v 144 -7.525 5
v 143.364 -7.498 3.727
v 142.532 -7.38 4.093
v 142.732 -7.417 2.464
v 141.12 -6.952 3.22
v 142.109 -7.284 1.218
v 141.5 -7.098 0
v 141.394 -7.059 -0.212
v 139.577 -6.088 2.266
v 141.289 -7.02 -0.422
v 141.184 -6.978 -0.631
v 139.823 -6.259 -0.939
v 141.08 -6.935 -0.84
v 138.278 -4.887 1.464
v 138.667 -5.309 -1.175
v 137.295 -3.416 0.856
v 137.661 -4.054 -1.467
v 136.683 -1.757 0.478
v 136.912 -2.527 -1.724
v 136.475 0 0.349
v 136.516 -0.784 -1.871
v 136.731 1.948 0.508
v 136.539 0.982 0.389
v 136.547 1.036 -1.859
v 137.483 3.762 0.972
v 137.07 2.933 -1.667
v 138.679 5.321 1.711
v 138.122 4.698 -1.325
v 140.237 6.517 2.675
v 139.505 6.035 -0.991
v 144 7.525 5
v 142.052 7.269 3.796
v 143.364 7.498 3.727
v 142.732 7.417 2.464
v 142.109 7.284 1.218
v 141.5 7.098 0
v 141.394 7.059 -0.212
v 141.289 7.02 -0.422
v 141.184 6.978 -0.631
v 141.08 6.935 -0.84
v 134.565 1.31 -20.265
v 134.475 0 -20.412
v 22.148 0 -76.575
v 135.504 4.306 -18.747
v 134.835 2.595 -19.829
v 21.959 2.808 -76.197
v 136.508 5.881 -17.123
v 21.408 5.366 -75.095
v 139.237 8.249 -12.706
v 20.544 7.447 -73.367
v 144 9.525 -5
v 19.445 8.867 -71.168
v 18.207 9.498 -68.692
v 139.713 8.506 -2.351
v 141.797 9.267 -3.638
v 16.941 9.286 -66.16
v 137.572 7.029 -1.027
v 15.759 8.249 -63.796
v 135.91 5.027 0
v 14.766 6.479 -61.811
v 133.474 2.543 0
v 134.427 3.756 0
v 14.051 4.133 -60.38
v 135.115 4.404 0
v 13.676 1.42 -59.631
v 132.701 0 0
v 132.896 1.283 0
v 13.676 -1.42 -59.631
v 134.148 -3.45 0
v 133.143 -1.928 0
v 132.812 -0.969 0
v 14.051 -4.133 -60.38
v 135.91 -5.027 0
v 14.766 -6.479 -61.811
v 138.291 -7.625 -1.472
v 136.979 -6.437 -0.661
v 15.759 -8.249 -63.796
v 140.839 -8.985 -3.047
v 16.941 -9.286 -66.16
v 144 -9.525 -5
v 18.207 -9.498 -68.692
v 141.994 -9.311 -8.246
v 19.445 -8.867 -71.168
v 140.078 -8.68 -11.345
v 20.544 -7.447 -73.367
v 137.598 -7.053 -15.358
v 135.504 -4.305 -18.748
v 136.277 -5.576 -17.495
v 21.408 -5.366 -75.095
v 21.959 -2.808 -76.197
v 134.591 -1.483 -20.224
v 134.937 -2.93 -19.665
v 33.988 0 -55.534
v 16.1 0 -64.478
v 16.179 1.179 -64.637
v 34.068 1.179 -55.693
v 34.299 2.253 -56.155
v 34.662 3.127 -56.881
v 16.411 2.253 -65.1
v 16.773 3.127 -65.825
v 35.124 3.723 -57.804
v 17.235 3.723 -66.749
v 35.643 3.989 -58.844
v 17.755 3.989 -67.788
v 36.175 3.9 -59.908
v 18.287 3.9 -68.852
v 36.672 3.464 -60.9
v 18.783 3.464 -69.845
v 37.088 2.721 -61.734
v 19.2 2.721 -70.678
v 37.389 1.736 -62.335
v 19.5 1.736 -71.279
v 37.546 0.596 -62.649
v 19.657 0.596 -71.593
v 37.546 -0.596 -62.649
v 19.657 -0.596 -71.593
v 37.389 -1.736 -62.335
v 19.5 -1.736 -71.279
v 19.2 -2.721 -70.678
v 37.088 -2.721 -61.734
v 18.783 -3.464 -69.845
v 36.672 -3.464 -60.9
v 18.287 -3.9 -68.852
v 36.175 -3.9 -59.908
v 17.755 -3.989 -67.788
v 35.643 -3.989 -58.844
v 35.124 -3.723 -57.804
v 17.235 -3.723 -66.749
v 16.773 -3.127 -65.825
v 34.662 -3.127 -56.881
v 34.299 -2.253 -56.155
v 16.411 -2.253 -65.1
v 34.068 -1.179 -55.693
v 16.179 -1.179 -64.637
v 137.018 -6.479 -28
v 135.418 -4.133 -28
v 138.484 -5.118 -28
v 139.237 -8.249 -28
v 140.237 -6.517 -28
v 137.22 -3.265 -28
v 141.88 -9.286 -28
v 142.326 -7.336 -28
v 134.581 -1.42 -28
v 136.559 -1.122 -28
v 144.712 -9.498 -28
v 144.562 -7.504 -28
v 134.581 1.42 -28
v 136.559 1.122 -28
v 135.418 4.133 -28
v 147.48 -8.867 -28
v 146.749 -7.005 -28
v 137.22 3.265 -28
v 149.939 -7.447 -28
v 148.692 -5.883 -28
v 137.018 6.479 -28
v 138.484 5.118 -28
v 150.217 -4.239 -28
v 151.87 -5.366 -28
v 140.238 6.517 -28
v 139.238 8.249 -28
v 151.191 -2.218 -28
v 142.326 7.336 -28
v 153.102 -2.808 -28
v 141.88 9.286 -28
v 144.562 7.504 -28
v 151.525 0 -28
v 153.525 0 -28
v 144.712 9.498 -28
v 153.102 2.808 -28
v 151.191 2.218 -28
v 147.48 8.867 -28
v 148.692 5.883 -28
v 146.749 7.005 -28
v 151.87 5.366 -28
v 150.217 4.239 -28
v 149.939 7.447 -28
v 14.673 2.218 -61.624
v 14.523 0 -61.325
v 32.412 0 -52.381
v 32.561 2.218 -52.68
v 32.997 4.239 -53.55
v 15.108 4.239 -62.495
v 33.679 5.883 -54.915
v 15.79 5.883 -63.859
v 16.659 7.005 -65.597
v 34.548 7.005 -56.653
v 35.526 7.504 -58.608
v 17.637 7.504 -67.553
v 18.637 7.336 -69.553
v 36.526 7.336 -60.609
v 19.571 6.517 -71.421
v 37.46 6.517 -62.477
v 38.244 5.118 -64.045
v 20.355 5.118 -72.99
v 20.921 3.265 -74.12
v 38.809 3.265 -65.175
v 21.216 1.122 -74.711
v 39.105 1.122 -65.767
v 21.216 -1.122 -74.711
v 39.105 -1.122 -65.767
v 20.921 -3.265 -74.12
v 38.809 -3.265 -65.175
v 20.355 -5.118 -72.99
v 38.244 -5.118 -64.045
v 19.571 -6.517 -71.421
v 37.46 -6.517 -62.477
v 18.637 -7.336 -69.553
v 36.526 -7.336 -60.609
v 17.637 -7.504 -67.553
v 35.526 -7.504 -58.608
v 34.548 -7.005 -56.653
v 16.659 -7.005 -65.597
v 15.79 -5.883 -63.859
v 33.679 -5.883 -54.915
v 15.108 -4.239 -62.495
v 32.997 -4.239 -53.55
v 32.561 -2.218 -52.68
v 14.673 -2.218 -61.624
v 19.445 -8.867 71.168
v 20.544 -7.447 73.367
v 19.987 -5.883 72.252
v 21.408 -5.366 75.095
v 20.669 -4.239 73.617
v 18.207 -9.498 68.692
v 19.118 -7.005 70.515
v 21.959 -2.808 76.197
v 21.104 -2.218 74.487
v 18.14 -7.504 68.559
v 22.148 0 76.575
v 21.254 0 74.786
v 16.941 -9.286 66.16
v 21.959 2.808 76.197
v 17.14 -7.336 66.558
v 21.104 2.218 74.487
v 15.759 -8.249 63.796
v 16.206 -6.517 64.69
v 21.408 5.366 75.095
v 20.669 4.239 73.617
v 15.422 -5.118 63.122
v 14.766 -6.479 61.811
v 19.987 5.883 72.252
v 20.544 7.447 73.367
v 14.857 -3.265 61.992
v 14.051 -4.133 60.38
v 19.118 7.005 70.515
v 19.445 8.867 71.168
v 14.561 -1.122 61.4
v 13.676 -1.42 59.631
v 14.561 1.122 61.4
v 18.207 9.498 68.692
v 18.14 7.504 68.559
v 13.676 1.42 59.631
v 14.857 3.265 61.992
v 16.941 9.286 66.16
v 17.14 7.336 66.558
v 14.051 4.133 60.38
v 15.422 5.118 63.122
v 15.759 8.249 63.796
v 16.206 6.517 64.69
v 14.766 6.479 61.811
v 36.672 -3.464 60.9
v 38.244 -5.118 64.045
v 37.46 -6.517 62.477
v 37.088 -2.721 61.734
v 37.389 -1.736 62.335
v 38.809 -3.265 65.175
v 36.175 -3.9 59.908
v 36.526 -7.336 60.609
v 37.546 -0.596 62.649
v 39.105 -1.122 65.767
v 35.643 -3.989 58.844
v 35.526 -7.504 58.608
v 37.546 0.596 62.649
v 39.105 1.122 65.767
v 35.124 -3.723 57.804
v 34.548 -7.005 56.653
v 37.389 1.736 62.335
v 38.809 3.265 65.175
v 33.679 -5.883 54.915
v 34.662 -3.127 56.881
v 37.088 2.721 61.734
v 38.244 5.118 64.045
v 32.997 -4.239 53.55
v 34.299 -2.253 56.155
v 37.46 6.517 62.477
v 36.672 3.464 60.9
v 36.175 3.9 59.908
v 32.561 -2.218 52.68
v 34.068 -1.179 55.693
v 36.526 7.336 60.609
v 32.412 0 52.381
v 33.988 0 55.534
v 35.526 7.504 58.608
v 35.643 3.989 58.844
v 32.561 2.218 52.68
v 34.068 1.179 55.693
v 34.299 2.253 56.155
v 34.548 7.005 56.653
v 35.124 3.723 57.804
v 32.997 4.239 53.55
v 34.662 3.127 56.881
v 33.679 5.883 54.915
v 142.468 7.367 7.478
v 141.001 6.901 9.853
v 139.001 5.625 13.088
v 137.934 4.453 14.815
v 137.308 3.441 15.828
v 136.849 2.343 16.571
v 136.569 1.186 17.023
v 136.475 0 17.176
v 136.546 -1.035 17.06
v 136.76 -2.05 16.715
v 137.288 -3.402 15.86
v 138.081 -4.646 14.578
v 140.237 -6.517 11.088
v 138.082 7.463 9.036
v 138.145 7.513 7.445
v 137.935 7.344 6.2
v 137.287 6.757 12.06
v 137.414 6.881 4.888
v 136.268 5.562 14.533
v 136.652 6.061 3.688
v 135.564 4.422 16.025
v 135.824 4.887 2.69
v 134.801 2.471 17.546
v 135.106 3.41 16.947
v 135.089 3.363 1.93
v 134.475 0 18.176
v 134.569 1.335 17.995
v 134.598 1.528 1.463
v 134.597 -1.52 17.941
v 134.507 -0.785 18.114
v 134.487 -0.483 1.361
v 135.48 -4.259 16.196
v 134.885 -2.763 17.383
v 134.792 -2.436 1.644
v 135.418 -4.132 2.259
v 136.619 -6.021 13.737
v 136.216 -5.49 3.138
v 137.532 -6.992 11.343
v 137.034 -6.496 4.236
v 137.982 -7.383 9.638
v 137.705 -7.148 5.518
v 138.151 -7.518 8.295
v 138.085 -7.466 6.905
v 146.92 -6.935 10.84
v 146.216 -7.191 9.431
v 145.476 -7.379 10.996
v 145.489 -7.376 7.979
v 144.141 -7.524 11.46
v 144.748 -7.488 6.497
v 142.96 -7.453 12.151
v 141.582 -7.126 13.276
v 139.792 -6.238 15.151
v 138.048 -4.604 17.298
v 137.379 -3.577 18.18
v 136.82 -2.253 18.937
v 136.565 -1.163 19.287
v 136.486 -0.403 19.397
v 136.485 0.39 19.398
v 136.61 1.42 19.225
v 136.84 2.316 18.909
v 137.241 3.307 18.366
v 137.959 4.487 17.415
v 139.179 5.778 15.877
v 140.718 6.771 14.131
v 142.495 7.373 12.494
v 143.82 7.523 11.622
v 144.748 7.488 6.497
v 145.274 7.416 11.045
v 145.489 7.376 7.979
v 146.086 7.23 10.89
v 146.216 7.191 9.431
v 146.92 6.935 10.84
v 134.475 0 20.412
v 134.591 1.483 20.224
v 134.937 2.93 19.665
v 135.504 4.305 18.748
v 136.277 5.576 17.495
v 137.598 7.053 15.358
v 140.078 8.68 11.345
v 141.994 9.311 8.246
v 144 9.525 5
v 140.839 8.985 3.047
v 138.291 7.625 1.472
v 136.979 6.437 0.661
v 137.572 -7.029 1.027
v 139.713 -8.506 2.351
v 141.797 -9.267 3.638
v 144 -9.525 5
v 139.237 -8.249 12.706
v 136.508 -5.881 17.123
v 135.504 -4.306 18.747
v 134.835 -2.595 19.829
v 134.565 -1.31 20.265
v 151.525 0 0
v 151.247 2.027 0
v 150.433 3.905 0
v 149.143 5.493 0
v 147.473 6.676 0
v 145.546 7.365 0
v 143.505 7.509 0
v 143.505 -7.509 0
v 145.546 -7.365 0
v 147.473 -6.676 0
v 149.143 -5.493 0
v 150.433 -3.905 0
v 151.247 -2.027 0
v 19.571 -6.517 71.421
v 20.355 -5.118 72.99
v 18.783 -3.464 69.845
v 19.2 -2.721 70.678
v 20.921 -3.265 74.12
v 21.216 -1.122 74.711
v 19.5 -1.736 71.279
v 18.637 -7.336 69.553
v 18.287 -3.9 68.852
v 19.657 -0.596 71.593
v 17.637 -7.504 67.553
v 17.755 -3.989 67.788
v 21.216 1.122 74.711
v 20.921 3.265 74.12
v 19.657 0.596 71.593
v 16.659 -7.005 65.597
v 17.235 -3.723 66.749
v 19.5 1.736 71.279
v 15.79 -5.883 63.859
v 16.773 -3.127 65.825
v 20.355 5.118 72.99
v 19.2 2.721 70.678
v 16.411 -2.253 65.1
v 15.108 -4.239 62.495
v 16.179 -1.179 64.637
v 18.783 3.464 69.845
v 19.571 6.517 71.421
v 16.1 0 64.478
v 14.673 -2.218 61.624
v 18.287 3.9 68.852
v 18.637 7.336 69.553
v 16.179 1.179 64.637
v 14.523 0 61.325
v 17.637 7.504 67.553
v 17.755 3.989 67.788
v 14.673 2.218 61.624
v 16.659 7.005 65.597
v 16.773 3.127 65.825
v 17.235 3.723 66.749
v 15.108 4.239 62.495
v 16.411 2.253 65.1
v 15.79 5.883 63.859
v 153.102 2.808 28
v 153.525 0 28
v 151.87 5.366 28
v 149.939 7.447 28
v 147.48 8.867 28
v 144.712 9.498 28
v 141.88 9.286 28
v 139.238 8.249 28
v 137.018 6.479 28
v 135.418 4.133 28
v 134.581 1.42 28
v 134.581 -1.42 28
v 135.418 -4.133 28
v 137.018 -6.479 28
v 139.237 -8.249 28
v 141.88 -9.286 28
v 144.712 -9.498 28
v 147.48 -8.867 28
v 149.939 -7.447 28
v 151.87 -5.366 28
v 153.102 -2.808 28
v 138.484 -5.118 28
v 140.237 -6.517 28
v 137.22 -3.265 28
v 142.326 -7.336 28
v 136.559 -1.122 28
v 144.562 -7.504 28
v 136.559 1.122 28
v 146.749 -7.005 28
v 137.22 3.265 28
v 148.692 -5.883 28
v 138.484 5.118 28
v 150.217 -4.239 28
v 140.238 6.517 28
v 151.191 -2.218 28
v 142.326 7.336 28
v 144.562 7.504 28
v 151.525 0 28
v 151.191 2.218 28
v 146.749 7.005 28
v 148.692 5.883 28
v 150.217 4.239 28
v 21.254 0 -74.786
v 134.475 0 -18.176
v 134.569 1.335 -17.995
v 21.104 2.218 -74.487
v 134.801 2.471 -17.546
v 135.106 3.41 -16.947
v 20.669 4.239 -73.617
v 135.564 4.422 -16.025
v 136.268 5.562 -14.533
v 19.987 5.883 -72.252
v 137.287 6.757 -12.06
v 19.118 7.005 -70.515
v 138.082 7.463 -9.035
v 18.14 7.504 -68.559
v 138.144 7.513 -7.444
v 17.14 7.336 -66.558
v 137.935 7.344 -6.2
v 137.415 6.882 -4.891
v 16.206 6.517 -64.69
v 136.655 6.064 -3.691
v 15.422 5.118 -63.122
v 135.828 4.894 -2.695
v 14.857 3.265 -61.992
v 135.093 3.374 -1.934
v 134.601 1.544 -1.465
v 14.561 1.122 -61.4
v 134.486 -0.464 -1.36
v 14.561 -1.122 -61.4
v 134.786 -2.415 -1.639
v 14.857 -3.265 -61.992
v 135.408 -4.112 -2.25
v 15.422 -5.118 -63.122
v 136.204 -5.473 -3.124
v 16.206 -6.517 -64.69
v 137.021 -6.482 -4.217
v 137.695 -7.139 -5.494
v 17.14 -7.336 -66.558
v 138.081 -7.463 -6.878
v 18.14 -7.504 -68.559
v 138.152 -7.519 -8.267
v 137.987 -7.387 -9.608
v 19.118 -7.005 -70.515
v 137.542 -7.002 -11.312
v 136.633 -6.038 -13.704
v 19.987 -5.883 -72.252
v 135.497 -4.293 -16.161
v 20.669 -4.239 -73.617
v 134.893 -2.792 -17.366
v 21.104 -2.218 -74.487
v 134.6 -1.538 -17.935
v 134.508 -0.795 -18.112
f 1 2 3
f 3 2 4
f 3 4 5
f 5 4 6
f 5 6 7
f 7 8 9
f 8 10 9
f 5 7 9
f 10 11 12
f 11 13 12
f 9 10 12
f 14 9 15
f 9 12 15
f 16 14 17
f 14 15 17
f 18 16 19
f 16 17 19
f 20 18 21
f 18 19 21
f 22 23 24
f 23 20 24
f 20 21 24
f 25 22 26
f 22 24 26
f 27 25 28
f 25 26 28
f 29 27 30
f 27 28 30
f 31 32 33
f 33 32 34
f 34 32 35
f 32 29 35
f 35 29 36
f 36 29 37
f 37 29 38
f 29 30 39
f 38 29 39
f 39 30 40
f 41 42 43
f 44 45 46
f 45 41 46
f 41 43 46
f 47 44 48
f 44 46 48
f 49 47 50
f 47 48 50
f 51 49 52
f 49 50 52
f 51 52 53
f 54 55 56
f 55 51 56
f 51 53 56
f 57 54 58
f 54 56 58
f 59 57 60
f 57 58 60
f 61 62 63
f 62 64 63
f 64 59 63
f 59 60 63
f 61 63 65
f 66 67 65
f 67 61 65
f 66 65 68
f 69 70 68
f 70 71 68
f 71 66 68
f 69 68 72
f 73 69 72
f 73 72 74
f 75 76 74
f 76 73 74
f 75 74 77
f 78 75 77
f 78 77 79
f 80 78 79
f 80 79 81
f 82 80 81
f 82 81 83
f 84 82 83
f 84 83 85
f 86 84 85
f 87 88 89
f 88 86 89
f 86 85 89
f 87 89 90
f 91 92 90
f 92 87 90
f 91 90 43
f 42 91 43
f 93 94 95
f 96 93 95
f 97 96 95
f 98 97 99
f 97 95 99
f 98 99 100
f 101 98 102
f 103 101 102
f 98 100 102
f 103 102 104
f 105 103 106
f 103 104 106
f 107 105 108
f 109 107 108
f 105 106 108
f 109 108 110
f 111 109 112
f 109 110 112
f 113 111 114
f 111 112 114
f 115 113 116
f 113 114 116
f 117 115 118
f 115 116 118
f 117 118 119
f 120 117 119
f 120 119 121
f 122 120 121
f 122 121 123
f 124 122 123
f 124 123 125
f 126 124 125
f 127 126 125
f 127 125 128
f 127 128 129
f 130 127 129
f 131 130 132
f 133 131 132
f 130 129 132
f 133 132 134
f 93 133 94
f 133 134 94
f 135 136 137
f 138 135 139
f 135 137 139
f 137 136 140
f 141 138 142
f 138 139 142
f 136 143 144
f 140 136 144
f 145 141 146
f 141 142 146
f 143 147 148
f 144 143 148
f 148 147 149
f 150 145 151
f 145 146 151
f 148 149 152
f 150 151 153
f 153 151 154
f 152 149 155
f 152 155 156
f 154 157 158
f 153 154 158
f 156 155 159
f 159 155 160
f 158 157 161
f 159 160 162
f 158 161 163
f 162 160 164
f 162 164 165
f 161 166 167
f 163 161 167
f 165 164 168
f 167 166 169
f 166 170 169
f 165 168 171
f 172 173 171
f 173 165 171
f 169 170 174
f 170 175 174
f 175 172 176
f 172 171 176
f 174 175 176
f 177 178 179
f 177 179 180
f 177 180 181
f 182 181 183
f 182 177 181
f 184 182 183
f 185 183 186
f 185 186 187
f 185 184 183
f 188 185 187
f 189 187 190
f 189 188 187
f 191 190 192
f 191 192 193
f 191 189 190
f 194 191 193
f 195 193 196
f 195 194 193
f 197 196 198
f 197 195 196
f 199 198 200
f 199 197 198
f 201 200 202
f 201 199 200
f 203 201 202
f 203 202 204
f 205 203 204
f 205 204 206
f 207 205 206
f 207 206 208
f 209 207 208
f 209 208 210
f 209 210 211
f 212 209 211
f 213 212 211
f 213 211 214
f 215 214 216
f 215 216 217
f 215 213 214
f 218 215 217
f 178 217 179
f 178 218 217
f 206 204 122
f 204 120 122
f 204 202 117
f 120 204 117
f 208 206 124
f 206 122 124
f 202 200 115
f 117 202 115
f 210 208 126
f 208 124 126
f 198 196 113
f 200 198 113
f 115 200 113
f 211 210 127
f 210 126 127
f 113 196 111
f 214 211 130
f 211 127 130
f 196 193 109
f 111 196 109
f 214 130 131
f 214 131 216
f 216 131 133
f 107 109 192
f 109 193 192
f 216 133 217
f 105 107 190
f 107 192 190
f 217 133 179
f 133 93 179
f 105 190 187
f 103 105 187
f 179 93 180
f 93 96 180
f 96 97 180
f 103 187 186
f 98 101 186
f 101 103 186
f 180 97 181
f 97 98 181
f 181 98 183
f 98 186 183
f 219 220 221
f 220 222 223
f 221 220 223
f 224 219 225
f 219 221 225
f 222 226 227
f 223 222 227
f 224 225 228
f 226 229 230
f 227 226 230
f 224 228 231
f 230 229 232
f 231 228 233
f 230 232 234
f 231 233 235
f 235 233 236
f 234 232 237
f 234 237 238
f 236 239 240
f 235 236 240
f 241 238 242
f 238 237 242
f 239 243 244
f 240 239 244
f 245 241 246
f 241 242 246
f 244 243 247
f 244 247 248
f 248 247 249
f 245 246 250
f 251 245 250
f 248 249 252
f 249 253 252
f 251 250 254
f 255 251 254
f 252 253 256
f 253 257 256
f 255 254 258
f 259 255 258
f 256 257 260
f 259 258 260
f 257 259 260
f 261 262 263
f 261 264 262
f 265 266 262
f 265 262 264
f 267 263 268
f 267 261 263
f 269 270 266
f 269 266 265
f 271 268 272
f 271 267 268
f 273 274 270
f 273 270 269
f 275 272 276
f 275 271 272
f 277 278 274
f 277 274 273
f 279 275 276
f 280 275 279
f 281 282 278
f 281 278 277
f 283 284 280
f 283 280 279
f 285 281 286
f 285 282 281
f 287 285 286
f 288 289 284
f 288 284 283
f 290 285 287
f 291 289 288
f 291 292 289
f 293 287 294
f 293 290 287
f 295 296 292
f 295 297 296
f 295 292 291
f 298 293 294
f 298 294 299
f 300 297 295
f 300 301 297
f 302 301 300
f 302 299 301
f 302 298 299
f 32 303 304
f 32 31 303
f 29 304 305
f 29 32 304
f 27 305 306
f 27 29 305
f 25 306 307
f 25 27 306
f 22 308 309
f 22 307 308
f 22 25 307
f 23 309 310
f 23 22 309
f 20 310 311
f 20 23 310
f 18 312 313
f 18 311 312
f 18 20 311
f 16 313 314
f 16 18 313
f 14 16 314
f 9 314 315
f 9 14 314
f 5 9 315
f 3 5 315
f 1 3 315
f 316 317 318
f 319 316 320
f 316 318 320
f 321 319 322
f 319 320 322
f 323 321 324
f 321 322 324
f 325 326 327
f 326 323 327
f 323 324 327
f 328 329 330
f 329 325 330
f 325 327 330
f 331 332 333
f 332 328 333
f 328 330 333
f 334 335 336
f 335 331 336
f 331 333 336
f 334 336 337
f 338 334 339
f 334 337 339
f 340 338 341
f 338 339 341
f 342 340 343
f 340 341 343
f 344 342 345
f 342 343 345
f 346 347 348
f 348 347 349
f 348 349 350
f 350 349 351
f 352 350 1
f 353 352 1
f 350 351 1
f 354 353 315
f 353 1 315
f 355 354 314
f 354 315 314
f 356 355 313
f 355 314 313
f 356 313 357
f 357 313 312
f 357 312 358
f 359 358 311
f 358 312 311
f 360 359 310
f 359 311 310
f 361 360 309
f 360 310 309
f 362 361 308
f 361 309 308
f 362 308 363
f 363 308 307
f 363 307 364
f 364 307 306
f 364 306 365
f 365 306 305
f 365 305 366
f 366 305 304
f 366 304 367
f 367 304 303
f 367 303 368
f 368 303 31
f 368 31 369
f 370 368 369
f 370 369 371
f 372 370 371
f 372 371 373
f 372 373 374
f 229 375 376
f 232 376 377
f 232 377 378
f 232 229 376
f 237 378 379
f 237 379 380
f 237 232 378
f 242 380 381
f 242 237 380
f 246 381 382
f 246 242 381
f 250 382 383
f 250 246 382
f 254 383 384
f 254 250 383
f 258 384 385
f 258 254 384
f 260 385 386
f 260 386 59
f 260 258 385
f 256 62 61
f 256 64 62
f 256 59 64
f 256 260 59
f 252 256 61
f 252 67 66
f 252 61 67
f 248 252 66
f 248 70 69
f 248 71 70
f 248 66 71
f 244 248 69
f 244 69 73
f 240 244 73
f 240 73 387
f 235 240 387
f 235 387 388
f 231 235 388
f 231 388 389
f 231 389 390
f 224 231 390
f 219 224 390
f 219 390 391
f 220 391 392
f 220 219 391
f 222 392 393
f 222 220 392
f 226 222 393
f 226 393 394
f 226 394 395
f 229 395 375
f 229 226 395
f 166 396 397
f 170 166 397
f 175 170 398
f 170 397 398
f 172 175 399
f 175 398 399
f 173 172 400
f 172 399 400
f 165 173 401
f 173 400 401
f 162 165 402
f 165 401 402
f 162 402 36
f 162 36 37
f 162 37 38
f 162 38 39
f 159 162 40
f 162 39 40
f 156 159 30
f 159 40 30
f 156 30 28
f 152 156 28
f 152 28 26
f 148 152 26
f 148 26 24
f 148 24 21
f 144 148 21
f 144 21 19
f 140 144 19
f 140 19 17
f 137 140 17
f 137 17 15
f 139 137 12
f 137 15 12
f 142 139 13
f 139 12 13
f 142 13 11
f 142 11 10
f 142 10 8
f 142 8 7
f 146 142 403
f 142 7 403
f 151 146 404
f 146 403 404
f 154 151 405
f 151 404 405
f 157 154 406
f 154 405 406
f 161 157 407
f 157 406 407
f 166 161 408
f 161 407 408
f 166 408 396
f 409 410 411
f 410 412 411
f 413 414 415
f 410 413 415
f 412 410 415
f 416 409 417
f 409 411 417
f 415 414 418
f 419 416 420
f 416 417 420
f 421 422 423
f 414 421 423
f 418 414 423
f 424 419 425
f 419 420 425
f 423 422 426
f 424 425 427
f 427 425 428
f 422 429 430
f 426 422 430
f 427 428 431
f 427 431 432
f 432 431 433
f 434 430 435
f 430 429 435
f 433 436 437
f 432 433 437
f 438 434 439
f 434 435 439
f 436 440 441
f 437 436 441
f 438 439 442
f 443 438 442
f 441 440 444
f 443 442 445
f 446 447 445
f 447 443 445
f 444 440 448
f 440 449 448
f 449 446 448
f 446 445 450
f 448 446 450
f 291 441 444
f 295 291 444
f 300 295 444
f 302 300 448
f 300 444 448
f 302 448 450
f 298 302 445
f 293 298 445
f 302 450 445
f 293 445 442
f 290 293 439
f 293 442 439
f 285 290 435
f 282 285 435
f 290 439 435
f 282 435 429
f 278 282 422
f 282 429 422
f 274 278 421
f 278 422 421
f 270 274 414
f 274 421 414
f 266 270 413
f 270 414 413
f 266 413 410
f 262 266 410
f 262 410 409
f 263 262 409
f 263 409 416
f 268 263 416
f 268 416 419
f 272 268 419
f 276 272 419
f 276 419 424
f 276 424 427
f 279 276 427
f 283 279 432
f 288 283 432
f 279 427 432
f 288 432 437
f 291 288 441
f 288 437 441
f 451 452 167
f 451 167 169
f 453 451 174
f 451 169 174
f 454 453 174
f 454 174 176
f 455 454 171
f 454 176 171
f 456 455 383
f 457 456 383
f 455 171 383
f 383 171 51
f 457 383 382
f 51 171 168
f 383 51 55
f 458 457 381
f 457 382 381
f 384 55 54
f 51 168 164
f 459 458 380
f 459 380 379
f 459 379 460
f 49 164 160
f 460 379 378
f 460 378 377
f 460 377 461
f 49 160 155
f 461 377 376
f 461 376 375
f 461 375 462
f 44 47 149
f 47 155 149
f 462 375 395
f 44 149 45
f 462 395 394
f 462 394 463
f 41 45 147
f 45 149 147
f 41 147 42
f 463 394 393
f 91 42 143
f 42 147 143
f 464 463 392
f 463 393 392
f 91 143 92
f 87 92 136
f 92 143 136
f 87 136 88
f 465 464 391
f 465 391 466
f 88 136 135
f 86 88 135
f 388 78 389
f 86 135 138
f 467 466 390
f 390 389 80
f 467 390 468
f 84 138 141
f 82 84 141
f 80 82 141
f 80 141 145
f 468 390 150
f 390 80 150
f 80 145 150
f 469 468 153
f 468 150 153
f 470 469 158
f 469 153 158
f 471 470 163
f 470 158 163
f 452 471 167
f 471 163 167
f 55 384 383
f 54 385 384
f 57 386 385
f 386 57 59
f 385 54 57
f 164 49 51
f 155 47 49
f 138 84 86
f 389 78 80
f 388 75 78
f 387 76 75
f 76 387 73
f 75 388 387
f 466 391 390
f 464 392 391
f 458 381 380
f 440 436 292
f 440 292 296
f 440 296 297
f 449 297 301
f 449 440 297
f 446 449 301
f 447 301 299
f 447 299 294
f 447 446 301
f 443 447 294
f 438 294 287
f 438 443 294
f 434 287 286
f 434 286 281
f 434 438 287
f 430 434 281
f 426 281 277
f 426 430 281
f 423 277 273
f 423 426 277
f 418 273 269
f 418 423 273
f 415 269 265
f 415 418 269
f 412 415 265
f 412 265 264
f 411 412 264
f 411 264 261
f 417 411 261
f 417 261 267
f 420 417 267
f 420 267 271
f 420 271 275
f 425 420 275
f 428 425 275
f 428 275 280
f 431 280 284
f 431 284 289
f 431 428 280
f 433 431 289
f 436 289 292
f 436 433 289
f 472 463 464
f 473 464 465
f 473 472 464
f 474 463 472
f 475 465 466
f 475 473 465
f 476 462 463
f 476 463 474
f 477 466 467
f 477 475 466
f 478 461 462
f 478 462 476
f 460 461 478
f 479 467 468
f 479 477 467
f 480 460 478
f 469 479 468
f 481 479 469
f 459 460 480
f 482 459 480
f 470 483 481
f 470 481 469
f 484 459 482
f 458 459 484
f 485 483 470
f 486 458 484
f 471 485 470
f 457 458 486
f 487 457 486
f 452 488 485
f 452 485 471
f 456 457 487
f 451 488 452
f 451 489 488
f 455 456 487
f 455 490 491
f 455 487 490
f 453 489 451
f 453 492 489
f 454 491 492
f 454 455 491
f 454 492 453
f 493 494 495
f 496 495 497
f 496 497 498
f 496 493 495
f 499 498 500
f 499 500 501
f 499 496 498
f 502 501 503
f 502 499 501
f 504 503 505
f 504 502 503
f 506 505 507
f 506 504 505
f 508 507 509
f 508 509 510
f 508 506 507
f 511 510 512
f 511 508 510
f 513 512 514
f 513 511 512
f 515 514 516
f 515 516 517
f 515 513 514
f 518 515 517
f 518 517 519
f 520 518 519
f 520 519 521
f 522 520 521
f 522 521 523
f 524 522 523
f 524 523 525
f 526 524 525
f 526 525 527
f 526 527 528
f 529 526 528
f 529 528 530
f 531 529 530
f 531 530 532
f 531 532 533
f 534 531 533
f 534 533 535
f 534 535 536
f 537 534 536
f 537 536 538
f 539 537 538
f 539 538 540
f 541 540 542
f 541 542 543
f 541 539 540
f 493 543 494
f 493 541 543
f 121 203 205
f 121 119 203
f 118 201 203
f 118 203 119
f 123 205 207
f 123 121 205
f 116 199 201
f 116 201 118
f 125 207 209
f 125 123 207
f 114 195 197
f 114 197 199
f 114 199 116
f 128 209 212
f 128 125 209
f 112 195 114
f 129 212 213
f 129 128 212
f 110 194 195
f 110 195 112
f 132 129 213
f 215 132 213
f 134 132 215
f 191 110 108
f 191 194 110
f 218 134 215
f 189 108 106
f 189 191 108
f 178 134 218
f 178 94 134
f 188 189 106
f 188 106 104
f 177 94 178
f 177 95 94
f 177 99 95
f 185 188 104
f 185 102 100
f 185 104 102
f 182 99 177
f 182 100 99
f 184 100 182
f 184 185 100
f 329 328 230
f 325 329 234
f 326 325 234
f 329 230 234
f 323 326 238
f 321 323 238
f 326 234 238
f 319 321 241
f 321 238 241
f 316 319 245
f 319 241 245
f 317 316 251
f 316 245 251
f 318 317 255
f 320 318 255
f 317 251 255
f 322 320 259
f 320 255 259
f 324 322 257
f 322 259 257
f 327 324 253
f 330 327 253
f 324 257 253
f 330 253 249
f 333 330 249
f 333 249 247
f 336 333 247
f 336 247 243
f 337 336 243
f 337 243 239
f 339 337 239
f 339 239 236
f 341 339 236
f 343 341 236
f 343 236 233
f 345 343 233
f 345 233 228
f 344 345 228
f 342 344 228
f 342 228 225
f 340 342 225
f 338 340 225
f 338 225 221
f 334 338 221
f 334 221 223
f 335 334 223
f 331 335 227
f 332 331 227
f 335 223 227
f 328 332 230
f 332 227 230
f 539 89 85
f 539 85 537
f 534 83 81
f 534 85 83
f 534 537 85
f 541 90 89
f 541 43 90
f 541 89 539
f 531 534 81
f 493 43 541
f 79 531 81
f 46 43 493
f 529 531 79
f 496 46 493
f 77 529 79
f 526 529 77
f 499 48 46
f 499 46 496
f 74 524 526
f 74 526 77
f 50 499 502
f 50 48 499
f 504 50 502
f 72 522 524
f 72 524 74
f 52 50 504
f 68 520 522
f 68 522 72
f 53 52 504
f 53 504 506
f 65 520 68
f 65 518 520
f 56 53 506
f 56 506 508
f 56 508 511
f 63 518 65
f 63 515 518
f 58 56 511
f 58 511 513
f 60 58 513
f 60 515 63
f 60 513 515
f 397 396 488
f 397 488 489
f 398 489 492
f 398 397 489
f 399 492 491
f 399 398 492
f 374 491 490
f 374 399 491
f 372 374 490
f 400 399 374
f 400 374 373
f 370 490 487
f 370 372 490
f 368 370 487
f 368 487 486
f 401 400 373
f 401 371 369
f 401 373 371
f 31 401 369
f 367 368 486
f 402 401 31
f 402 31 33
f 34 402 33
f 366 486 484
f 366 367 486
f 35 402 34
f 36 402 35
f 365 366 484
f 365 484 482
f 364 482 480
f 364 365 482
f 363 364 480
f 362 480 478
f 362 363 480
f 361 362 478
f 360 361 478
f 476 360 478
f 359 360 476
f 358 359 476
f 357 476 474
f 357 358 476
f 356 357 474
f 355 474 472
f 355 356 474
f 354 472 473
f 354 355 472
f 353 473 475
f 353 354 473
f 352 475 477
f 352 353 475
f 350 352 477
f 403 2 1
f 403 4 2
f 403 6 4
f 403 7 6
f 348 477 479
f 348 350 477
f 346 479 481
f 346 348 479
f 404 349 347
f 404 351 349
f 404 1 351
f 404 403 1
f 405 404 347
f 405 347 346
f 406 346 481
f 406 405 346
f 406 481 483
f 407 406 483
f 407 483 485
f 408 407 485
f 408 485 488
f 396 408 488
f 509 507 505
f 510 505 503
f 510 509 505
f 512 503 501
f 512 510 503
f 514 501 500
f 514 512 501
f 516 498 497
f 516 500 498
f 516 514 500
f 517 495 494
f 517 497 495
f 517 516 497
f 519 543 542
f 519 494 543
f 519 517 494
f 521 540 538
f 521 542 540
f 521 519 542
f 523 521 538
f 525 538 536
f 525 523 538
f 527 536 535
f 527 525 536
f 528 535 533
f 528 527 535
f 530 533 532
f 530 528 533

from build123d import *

# Parameters (mm, degrees)
SWEEP2_START            = -34.435446853
SWEEP2_OUTLINE_R        = 9.525
SWEEP2_OUTLINE_R_2      = 7.525
SWEEP2_DEPTH            = 160.996894379
CUT_EXTRUDE2_DEPTH      = 172.421230045
CUT_EXTRUDE2_DEPTH_BACK = 172.421230045
SKETCH5_3_R             = 9.525
SKETCH5_R               = 9.525
SKETCH5_R_2             = 7.525
BOSS_EXTRUDE6_DEPTH     = 28
SKETCH3_3_R             = 9.525
SKETCH3_3_R_2           = 7.525
CUT_EXTRUDE3_DEPTH      = 20
BOSS_EXTRUDE7_START     = -20
SKETCH3_4_R             = 7.525
SKETCH3_4_R_2           = 4
BOSS_EXTRUDE7_DEPTH     = 20
SKETCH7_R               = 7.525
CUT_EXTRUDE4_DEPTH      = 187.001646868


# Read off the part's stored shape, not the designer's step: Sweep2
with BuildPart() as part:
    # Sweep2 outline → Sweep2 (new body)
    with BuildSketch(Plane(origin=(0, 0, 0), x_dir=(0.4472135954999576, 0, -0.8944271909999161), z_dir=(0.894427190999916, 0, 0.447213595499958)).offset(SWEEP2_START)):
        with Locations((68.870893707, 0)):
            Circle(SWEEP2_OUTLINE_R)
        with Locations((68.870893707, 0)):
            Circle(SWEEP2_OUTLINE_R_2, mode=Mode.SUBTRACT)
    sweep2 = extrude(amount=SWEEP2_DEPTH)

    # Sketch5<3> → Cut-Extrude2 (cut, two sides: drawn at the far end of the back side and taken through both)
    with BuildSketch(Plane.XY.offset(-CUT_EXTRUDE2_DEPTH_BACK)):
        with Locations((144, 0)):
            Circle(SKETCH5_3_R)
    extrude(amount=CUT_EXTRUDE2_DEPTH + CUT_EXTRUDE2_DEPTH_BACK, mode=Mode.SUBTRACT)

    # Sketch5 → Boss-Extrude6 (add)
    with BuildSketch(Plane.XY):
        with Locations((144, 0)):
            Circle(SKETCH5_R)
        with Locations((144, 0)):
            Circle(SKETCH5_R_2, mode=Mode.SUBTRACT)
    boss_extrude6 = extrude(amount=-BOSS_EXTRUDE6_DEPTH)

    # Sketch3<3> → Cut-Extrude3 (cut)
    with BuildSketch(Plane(origin=(0, 0, -77), x_dir=(-0.447213595499958, 0, 0.894427190999916), z_dir=(-0.8944271909999159, 0, -0.4472135954999579))):
        Circle(SKETCH3_3_R)
        Circle(SKETCH3_3_R_2, mode=Mode.SUBTRACT)
    cut_extrude3 = extrude(amount=-CUT_EXTRUDE3_DEPTH, mode=Mode.SUBTRACT)

    # Mirror2: Sweep2, Boss-Extrude6, Cut-Extrude3 across plane
    add(sweep2.mirror(Plane.XY))
    add(boss_extrude6.mirror(Plane.XY))
    add(cut_extrude3.mirror(Plane.XY), mode=Mode.SUBTRACT)

    # Sketch7 → Cut-Extrude4 (cut, through all)
    with BuildSketch(Plane(origin=(0, 0, -28), x_dir=(-1, 0, 0), z_dir=(0, 0, -1))):
        with Locations(Location((-144, 0, 0), (0, 0, 180))):
            Circle(SKETCH7_R)
    extrude(amount=-CUT_EXTRUDE4_DEPTH, mode=Mode.SUBTRACT)


with BuildPart() as body_2:
    # Sketch3<4> → Boss-Extrude7 (new body)
    with BuildSketch(Plane(origin=(0, 0, -77), x_dir=(-0.447213595499958, 0, 0.894427190999916), z_dir=(-0.8944271909999159, 0, -0.4472135954999579)).offset(BOSS_EXTRUDE7_START)):
        Circle(SKETCH3_4_R)
        Circle(SKETCH3_4_R_2, mode=Mode.SUBTRACT)
    extrude(amount=-BOSS_EXTRUDE7_DEPTH)


with BuildPart() as body_3:
    # Mirror5: mirrored copy
    add(body_2.part.mirror(Plane.XY))


solid = Compound([part.part, body_2.part, body_3.part])
